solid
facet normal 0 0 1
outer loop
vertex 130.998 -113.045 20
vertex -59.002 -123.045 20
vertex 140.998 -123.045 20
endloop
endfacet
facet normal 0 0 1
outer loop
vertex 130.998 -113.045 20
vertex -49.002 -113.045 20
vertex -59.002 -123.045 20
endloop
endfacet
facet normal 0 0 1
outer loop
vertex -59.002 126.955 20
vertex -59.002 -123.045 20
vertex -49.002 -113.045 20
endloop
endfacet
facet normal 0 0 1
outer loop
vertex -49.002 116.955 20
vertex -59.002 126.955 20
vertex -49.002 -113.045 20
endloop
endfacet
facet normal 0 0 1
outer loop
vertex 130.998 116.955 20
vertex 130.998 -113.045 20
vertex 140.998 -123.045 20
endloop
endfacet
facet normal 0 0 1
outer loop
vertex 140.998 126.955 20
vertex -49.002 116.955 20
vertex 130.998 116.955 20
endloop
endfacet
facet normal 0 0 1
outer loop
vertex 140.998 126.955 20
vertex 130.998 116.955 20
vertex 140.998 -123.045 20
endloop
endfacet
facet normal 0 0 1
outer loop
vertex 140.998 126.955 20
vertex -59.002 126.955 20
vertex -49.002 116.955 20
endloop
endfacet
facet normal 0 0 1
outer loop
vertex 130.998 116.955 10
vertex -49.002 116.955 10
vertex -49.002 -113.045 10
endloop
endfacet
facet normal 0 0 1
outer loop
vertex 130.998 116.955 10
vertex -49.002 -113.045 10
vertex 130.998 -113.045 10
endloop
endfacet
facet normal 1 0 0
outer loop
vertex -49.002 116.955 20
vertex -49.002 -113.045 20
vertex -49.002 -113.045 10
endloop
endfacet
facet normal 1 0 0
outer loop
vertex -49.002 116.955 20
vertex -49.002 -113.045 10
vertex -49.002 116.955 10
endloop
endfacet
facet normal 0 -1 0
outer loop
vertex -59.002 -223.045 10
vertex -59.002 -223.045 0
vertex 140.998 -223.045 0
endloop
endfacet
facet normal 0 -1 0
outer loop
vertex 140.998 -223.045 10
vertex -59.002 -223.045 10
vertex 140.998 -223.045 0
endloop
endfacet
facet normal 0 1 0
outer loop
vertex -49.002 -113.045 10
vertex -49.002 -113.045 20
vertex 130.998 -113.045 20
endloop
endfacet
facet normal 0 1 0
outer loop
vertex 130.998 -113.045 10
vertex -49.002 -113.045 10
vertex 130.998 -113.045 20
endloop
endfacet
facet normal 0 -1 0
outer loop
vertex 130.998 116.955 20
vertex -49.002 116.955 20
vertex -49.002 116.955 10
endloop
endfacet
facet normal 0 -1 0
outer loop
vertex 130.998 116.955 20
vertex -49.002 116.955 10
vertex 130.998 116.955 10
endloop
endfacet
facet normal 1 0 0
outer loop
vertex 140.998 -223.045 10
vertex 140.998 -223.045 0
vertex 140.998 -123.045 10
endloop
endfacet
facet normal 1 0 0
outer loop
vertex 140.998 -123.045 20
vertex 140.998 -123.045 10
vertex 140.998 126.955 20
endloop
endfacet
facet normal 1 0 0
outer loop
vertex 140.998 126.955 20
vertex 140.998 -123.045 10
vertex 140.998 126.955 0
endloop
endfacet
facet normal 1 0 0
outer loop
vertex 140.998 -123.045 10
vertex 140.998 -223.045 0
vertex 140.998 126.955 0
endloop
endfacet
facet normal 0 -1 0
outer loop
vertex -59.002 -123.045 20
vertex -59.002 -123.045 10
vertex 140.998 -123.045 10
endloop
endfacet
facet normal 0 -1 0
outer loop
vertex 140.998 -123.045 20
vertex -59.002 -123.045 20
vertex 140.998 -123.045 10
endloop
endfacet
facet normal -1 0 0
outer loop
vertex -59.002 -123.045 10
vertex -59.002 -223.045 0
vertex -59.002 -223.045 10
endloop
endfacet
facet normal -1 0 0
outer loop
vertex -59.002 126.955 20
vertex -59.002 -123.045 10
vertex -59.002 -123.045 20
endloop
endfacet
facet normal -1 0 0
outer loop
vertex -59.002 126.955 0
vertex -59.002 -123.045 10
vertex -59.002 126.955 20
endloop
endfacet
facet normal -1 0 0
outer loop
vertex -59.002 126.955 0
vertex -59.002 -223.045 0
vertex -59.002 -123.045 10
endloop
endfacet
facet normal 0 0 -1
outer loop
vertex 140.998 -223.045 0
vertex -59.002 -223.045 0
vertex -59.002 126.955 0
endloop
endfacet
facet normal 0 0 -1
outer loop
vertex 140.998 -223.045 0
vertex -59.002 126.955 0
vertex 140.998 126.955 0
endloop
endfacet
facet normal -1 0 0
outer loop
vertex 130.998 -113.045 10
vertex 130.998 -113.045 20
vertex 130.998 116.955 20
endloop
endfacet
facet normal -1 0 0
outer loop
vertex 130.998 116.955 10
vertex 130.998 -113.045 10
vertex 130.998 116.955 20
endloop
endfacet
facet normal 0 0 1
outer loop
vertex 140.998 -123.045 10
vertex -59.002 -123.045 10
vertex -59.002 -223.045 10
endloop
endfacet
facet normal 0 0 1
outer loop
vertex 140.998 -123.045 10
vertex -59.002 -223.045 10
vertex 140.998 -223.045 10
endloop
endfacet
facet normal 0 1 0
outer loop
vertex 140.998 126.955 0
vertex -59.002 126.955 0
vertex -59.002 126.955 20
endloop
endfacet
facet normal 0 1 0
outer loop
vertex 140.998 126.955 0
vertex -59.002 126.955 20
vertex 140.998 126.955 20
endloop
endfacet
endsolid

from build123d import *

# Parameters (mm, degrees)
F0_W     = 200
F0_H     = 250
F1_DEPTH = 200
F2_W     = 180
F2_H     = 230
F3_DEPTH = 190
F4_DEPTH = 180
F0_H_2   = 100
F5_DEPTH = 10


with BuildPart() as f1:
    # F0 (on Top) → F1 (new body)
    with BuildSketch(Plane.XY):
        with Locations((40.9984113305, 1.9545629621)):
            Rectangle(F0_W, F0_H)
    extrude(amount=F1_DEPTH)

    # F2 (on face) → F3 (cut)
    with BuildSketch(Plane.XY.offset(200)):
        with Locations((40.9984113305, 1.9545629621)):
            Rectangle(F2_W, F2_H)
    extrude(amount=-F3_DEPTH, mode=Mode.SUBTRACT)

    # F4 (cut): a face of the model
    f4_faces = [f1.faces().sort_by_distance(p)[0] for p in [
        (-55.8000265508, 1.9545629621, 200),
    ]]
    extrude(f4_faces, amount=-F4_DEPTH, mode=Mode.SUBTRACT)

    # F0 (on Top) → F5 (join)
    with BuildSketch(Plane.XY):
        with Locations((40.9984113305, -173.0454370379)):
            Rectangle(F0_W, F0_H_2)
    extrude(amount=F5_DEPTH)


solid = f1.part
